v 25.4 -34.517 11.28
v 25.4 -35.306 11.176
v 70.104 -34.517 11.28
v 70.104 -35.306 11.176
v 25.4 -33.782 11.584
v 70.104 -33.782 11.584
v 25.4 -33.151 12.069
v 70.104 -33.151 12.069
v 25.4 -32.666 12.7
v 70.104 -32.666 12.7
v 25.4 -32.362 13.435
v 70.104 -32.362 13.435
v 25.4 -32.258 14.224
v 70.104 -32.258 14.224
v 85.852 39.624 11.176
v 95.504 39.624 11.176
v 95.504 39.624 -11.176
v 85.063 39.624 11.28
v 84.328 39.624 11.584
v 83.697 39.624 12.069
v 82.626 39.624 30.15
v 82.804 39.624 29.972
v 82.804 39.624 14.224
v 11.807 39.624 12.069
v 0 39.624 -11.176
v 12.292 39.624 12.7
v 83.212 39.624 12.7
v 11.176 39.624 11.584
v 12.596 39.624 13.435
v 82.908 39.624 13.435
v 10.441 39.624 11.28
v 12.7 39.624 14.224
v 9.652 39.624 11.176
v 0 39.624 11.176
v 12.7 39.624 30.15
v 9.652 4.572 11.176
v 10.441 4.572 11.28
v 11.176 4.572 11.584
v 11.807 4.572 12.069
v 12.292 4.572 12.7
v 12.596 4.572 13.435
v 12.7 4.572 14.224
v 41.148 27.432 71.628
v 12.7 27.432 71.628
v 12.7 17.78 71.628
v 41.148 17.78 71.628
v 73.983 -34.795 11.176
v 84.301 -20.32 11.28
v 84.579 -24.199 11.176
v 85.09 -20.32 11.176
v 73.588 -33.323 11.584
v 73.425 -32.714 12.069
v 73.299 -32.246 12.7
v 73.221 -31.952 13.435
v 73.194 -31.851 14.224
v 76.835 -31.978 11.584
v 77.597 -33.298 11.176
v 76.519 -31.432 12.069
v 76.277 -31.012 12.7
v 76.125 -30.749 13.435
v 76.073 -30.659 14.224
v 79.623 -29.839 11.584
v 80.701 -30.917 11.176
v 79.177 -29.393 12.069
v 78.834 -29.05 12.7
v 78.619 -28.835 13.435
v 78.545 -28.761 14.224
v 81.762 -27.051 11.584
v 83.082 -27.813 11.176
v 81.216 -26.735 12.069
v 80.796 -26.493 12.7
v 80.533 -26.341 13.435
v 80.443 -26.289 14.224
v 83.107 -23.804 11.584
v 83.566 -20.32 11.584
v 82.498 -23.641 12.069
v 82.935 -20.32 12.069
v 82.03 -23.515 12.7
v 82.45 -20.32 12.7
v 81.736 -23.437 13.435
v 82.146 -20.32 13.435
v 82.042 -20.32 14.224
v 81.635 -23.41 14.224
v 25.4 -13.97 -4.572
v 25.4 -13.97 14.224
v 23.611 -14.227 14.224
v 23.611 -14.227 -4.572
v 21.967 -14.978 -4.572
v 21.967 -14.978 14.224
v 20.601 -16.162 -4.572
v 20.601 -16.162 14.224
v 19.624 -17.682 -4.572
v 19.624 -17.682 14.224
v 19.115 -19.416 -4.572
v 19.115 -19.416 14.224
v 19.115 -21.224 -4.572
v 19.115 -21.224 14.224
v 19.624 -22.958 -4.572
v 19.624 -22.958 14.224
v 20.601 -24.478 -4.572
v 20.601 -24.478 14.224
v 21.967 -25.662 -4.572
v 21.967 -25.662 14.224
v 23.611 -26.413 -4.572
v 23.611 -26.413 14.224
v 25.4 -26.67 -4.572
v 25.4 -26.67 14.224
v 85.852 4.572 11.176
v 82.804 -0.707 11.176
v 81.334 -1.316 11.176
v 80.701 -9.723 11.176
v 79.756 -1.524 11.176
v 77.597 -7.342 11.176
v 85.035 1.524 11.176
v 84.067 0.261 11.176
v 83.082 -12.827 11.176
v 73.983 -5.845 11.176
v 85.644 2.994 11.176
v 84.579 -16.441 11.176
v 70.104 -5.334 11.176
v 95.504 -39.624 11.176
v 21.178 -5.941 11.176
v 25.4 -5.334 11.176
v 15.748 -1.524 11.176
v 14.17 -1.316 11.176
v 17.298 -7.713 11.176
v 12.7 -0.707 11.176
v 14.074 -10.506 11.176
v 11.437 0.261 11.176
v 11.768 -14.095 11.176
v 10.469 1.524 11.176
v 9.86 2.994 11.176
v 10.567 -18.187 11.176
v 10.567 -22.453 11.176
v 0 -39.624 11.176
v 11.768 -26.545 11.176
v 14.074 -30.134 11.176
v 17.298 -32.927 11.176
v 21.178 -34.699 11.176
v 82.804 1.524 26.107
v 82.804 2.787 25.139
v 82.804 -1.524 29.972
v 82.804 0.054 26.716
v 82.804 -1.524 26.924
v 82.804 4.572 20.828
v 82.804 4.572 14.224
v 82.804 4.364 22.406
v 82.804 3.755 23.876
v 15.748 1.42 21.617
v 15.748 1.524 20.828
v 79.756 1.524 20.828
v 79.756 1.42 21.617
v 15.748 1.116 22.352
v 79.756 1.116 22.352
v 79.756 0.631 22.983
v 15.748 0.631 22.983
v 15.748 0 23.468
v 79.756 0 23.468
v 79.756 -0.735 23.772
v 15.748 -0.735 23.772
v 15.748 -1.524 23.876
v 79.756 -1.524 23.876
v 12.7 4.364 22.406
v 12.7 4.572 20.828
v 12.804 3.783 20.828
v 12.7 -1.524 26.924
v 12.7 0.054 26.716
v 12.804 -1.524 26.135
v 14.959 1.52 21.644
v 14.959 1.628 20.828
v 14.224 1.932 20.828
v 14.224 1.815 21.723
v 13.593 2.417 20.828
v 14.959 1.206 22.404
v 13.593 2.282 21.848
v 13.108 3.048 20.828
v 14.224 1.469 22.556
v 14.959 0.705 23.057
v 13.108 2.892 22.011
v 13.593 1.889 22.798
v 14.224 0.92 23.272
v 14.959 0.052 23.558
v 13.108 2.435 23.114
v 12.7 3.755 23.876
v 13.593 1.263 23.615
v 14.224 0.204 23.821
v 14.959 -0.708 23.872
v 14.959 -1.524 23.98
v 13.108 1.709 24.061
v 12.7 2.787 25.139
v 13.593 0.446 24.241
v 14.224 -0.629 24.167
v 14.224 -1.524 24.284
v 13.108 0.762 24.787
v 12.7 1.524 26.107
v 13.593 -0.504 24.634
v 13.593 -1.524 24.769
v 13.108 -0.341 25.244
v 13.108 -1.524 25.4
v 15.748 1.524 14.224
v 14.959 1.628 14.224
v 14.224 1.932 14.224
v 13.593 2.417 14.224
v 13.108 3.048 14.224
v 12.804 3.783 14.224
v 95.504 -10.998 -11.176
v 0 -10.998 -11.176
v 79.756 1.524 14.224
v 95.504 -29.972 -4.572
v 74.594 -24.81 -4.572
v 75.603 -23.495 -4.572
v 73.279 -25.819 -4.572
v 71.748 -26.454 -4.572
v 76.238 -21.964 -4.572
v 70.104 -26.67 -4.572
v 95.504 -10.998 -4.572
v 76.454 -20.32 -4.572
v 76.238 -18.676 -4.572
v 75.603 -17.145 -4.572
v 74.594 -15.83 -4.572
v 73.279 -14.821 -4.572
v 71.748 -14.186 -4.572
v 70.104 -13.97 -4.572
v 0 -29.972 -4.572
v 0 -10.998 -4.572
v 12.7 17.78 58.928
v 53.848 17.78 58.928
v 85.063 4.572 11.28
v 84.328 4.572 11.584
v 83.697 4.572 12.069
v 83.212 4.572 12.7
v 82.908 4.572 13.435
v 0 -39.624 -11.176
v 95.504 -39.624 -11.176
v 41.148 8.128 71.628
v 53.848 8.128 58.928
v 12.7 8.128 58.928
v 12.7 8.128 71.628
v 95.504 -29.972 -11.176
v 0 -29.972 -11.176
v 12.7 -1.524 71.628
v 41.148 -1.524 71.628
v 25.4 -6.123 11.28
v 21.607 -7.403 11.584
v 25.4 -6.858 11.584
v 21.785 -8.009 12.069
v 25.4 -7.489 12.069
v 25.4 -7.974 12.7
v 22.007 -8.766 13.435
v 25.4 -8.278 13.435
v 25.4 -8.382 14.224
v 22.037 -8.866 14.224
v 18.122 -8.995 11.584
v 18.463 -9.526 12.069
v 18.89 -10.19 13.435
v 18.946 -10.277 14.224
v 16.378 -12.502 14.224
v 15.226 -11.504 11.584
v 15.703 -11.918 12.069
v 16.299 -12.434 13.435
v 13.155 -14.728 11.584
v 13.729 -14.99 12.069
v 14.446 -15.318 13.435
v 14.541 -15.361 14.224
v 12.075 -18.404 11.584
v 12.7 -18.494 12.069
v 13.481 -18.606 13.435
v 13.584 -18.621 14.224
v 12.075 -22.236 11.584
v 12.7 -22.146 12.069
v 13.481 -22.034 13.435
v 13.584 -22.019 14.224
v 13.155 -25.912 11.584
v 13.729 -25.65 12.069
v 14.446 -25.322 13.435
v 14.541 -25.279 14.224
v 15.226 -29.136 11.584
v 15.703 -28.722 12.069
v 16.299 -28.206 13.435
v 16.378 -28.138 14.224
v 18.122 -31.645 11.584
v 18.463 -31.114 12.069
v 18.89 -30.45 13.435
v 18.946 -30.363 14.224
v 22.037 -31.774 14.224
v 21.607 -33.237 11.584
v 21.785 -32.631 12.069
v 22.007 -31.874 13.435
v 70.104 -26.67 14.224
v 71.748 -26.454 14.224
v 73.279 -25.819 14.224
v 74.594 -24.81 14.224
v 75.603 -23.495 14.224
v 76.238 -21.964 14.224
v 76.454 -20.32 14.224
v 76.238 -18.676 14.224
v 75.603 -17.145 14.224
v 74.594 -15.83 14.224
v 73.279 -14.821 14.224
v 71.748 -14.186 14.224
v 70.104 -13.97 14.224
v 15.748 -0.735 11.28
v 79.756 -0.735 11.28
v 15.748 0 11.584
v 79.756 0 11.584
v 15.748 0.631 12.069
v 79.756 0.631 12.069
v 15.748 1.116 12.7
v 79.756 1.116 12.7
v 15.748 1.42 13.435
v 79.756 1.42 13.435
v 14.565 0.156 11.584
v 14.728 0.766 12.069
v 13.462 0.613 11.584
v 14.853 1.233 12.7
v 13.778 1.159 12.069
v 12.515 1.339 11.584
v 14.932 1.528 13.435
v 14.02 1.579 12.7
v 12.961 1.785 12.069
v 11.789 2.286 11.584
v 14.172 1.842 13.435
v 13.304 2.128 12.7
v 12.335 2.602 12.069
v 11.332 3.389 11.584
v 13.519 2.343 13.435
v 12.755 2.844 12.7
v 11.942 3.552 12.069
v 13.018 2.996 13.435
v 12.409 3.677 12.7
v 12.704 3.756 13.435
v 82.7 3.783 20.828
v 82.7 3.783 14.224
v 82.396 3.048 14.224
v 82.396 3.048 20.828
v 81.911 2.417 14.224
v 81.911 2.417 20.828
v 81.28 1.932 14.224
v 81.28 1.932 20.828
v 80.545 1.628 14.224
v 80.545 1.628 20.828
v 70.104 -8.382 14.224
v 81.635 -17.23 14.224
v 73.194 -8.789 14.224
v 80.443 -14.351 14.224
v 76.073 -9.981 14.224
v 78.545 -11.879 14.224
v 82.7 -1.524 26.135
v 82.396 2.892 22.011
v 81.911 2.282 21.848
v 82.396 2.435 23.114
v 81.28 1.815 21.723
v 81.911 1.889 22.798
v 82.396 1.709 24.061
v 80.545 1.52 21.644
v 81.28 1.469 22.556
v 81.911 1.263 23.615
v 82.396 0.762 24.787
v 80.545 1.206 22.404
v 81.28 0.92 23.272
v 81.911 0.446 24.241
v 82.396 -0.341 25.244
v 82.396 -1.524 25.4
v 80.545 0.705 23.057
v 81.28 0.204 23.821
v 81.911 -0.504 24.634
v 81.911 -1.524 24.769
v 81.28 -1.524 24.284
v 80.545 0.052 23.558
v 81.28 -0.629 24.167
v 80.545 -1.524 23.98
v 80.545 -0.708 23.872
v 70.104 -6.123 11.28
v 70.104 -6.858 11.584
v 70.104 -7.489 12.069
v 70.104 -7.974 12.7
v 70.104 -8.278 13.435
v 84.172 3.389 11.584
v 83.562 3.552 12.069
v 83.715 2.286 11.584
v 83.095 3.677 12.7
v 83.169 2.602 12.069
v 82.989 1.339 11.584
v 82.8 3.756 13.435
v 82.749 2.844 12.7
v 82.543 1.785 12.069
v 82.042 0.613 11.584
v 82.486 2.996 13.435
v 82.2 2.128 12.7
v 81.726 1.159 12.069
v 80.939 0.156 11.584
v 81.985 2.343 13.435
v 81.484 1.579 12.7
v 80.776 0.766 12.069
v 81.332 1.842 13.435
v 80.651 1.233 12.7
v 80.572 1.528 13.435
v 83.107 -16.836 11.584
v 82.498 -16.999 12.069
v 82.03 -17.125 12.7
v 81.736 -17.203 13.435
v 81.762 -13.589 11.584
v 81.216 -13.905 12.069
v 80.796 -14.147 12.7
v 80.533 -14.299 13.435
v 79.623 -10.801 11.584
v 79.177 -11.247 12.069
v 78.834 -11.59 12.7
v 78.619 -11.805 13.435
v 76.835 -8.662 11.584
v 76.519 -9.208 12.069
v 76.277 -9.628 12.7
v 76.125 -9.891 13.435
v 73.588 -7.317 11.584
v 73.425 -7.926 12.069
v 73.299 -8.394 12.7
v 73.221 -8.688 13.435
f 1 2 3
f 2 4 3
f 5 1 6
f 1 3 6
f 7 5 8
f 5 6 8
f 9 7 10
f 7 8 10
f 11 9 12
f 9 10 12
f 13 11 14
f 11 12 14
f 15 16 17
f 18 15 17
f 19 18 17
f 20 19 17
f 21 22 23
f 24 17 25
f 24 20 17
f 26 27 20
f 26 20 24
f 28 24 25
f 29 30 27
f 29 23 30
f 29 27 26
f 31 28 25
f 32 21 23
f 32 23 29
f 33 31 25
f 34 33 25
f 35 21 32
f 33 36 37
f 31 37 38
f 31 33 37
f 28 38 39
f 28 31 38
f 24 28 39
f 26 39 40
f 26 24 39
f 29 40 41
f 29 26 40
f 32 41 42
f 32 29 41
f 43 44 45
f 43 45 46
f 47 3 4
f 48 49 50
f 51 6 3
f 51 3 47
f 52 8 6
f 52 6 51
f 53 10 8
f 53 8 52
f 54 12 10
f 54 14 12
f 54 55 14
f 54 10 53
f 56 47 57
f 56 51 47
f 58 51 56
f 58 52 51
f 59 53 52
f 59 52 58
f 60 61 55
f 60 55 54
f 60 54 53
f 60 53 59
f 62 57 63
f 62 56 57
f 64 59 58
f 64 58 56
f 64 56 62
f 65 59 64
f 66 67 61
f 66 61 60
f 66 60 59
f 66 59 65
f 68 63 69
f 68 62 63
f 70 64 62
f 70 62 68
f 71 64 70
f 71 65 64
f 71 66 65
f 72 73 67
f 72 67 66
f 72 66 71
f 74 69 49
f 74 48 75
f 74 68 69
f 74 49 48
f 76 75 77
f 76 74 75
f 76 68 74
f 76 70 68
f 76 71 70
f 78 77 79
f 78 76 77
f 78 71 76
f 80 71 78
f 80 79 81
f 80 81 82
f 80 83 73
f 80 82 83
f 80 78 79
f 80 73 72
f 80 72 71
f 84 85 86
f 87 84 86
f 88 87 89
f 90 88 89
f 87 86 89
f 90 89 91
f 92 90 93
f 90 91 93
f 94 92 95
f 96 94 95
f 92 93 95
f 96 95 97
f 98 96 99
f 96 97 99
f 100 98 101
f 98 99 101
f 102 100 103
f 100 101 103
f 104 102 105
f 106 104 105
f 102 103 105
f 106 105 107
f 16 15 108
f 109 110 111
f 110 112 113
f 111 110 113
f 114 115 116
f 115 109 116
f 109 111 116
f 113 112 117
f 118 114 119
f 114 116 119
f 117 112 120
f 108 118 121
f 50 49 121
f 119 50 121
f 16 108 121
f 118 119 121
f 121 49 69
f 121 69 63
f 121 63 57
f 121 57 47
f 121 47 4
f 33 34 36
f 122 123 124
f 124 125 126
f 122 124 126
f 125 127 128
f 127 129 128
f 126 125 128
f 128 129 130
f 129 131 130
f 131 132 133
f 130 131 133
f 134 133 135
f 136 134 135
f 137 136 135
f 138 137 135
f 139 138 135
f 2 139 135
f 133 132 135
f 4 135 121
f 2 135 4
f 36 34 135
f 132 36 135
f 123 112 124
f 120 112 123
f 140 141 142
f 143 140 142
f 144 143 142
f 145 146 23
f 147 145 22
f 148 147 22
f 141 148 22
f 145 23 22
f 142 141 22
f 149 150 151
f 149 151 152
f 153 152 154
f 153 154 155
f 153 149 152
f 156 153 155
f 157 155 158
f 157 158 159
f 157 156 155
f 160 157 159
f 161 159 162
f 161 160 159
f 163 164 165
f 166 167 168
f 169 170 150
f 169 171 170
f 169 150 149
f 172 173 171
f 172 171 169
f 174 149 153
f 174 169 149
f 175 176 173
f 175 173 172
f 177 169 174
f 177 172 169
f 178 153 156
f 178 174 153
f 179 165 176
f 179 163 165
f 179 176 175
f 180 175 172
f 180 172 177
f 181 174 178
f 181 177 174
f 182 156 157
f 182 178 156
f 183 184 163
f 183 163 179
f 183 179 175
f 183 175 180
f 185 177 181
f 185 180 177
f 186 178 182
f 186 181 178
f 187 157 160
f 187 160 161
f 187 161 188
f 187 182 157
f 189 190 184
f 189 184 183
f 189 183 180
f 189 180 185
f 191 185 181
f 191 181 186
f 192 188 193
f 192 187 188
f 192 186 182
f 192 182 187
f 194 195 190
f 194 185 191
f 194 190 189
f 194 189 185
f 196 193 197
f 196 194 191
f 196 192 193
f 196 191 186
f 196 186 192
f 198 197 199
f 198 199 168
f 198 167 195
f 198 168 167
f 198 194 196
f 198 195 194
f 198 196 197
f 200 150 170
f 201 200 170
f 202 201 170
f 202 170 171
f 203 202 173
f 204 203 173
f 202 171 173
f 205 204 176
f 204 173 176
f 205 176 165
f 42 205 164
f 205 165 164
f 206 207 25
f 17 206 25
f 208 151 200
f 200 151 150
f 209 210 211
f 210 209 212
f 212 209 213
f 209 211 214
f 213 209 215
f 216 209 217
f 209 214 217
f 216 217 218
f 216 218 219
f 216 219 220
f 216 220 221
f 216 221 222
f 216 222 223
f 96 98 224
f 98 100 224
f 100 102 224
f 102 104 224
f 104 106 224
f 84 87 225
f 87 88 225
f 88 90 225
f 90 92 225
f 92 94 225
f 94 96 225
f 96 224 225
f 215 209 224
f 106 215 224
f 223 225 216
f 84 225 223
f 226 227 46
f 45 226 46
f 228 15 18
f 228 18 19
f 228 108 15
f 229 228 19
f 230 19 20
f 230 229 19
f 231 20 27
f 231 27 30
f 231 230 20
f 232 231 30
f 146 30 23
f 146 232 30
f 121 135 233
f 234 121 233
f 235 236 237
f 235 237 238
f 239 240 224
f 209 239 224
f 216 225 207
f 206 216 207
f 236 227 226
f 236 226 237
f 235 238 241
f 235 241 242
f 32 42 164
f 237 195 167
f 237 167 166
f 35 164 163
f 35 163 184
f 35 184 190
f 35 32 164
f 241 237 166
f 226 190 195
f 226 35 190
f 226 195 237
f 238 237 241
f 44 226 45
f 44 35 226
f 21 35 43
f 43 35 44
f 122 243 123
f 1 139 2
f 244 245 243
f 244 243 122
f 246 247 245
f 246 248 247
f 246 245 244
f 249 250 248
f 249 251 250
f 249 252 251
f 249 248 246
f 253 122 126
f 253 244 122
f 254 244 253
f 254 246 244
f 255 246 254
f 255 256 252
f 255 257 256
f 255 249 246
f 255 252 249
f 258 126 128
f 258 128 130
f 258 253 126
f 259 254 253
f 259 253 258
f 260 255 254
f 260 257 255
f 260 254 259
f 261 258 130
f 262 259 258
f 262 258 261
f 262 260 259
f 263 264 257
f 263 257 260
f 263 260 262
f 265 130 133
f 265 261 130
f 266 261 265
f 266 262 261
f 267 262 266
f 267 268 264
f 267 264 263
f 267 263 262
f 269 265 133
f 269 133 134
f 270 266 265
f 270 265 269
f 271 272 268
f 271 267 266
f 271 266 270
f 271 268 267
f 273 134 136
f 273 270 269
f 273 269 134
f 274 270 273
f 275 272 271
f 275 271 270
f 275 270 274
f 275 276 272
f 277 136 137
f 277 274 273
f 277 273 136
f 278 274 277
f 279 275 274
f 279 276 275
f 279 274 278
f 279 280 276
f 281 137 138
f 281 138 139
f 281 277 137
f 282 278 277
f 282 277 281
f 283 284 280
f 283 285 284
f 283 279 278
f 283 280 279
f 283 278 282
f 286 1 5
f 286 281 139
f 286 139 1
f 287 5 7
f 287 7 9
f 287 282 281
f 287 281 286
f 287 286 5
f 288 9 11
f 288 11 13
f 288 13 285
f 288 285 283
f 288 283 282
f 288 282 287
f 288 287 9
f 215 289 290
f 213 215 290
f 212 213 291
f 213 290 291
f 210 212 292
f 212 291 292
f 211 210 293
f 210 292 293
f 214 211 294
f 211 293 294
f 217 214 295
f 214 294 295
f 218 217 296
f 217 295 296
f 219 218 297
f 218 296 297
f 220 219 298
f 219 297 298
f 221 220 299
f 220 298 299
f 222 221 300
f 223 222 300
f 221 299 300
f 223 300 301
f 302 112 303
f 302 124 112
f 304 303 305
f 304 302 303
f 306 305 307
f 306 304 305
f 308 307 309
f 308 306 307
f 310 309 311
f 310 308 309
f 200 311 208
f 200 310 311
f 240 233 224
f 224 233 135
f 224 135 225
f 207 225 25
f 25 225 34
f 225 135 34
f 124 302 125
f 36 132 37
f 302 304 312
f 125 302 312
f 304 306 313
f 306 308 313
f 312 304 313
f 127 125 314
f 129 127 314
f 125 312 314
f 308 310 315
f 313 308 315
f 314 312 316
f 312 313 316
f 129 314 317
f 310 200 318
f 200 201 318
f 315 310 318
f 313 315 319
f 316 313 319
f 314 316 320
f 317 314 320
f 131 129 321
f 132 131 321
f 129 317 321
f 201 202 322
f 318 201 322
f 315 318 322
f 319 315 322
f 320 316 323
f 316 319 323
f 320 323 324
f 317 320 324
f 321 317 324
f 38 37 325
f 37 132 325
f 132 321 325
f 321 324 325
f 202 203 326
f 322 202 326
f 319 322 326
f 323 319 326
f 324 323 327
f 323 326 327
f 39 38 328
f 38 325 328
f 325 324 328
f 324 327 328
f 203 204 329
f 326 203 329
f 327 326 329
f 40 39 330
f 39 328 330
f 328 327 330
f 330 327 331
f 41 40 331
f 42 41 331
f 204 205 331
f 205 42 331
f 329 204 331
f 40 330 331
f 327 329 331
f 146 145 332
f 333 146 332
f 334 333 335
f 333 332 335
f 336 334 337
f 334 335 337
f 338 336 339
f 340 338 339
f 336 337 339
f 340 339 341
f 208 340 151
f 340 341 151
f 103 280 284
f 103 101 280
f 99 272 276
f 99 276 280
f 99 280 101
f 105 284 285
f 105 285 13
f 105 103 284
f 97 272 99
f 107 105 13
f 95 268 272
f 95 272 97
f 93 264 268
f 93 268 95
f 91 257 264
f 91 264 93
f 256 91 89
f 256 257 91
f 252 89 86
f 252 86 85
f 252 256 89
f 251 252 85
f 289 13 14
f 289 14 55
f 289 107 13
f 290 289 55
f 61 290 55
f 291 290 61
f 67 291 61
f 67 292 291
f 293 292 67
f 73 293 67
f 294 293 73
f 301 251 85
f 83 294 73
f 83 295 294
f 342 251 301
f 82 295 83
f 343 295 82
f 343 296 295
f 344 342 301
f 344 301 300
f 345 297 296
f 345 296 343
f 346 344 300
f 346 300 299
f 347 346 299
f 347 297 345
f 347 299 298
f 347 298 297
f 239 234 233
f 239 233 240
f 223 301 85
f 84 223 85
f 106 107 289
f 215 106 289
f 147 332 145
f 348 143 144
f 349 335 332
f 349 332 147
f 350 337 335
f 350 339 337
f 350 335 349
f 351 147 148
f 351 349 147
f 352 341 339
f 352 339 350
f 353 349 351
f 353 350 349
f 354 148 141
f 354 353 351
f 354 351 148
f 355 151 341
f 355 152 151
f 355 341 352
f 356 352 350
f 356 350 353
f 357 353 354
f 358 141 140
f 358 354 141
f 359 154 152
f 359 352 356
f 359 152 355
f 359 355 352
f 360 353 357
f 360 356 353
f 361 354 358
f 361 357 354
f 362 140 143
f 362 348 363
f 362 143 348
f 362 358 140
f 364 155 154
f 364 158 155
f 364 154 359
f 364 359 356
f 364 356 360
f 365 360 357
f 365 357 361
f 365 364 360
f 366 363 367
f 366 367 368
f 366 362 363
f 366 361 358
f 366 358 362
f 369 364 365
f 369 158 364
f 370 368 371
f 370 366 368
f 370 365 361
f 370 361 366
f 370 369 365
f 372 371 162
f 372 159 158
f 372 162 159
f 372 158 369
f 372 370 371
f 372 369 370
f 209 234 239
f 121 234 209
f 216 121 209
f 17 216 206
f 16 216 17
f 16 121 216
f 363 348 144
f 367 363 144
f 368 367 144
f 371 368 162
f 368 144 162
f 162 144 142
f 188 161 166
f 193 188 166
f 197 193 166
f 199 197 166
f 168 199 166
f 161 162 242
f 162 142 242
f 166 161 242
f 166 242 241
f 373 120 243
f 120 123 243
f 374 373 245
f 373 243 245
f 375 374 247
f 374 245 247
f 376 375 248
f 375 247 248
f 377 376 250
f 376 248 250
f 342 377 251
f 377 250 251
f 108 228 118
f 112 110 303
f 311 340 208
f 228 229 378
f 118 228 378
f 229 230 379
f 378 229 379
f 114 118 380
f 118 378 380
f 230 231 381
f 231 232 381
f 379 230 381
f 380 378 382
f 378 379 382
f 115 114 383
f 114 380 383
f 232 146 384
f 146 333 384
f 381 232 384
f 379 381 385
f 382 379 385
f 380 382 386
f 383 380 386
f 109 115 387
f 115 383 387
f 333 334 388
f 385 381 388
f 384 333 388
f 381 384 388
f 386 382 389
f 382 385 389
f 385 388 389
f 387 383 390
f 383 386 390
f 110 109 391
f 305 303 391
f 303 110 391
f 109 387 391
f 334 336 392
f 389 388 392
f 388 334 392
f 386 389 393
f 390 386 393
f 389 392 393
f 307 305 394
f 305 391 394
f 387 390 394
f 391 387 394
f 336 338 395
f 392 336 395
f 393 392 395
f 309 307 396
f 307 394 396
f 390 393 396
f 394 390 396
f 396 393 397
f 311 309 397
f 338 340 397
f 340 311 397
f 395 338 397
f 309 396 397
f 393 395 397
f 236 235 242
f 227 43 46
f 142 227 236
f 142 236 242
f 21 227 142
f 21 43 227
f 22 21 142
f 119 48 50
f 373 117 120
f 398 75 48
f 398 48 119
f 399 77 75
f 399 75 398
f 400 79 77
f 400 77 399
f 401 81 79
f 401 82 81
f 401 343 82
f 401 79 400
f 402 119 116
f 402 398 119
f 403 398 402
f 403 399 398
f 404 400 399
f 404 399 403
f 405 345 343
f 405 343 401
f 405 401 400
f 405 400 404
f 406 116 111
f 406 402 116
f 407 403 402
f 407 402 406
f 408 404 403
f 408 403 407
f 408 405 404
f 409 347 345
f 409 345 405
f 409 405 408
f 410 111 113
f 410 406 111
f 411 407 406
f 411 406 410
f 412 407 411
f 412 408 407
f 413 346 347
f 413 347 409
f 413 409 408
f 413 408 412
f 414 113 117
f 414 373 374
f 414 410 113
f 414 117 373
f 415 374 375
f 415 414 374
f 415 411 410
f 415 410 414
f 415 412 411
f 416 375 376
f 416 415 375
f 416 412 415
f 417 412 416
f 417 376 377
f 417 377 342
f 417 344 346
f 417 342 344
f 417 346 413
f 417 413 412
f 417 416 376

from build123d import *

# Parameters (mm, degrees)
F1_DEPTH = 95.504
F3_DEPTH = 3.048
F4_DEPTH = 22.353
F6_DEPTH = 41.148
F5_W     = 70.104
F5_H     = 12.7
F7_DEPTH = 38.1
F8_W     = 9.652
F8_H     = 12.7
F9_DEPTH = 82.805
F10_F1_R = 3.0479
F10_F2_R = 3.048
F10_F3_R = 3.048


# Not quite as in the source:
# - a fillet or chamfer is up to 0.001 mm smaller than in the source, because OpenCascade refuses the exact size


with BuildPart() as f1:
    # F0 (on Right) → F1 (new body)
    with BuildSketch(Plane.YZ):
        Polygon((39.624, -11.176), (39.624, 11.176), (-39.624, 11.176), (-39.624, -11.176), (-29.972, -11.176), (-29.972, -4.572), (-10.9982, -4.572), (-10.9982, -11.176), align=None)
    extrude(amount=F1_DEPTH)

    # F2 (on face) → F3 (join)
    with BuildSketch(Plane.XY.offset(11.176)):
        with BuildLine():
            ThreePointArc((25.4, -26.67), (19.05, -20.32), (25.4, -13.97))
            Line((25.4, -13.97), (35.509072361, -13.97))
            ThreePointArc((35.509072361, -13.97), (31.1753590365, -9.871982389), (25.4, -8.382))
            ThreePointArc((25.4, -8.382), (13.462, -20.32), (25.4, -32.258))
            ThreePointArc((25.4, -32.258), (31.1753590365, -30.768017611), (35.509072361, -26.67))
            Line((35.509072361, -26.67), (25.4, -26.67))
        make_face()
        with BuildLine():
            ThreePointArc((25.4, -8.382), (31.1753590365, -9.871982389), (35.509072361, -13.97))
            Line((35.509072361, -13.97), (59.994927639, -13.97))
            ThreePointArc((59.994927639, -13.97), (64.3286409635, -9.871982389), (70.104, -8.382))
            Line((70.104, -8.382), (25.4, -8.382))
        make_face()
        with BuildLine():
            Line((59.994927639, -26.67), (35.509072361, -26.67))
            ThreePointArc((35.509072361, -26.67), (31.1753590365, -30.768017611), (25.4, -32.258))
            Line((25.4, -32.258), (70.104, -32.258))
            ThreePointArc((70.104, -32.258), (64.3286409635, -30.768017611), (59.994927639, -26.67))
        make_face()
        with BuildLine():
            ThreePointArc((70.104, -8.382), (64.3286409635, -9.871982389), (59.994927639, -13.97))
            Line((59.994927639, -13.97), (70.104, -13.97))
            ThreePointArc((70.104, -13.97), (74.5941280605, -15.8298719395), (76.454, -20.32))
            ThreePointArc((76.454, -20.32), (74.5941280605, -24.8101280605), (70.104, -26.67))
            Line((70.104, -26.67), (59.994927639, -26.67))
            ThreePointArc((59.994927639, -26.67), (64.3286409635, -30.768017611), (70.104, -32.258))
            ThreePointArc((70.104, -32.258), (78.5454407538, -28.7614407538), (82.042, -20.32))
            ThreePointArc((82.042, -20.32), (78.5454407538, -11.8785592462), (70.104, -8.382))
        make_face()
    extrude(amount=F3_DEPTH)

    # F2 (on face) → F4 (cut, through all)
    with BuildSketch(Plane.XY.offset(11.176)):
        with BuildLine():
            ThreePointArc((25.4, -26.67), (29.8901280605, -24.8101280605), (31.75, -20.32))
            ThreePointArc((31.75, -20.32), (29.8901280605, -15.8298719395), (25.4, -13.97))
            ThreePointArc((25.4, -13.97), (19.05, -20.32), (25.4, -26.67))
        make_face()
        with BuildLine():
            ThreePointArc((25.4, -13.97), (29.8901280605, -15.8298719395), (31.75, -20.32))
            ThreePointArc((31.75, -20.32), (29.8901280605, -24.8101280605), (25.4, -26.67))
            Line((25.4, -26.67), (35.509072361, -26.67))
            ThreePointArc((35.509072361, -26.67), (36.8716596412, -23.6240685642), (37.338, -20.32))
            ThreePointArc((37.338, -20.32), (36.8716596412, -17.0159314358), (35.509072361, -13.97))
            Line((35.509072361, -13.97), (25.4, -13.97))
        make_face()
        with BuildLine():
            Line((59.994927639, -13.97), (35.509072361, -13.97))
            ThreePointArc((35.509072361, -13.97), (36.8716596412, -17.0159314358), (37.338, -20.32))
            ThreePointArc((37.338, -20.32), (36.8716596412, -23.6240685642), (35.509072361, -26.67))
            Line((35.509072361, -26.67), (59.994927639, -26.67))
            ThreePointArc((59.994927639, -26.67), (58.166, -20.32), (59.994927639, -13.97))
        make_face()
        with BuildLine():
            Line((70.104, -13.97), (59.994927639, -13.97))
            ThreePointArc((59.994927639, -13.97), (58.166, -20.32), (59.994927639, -26.67))
            Line((59.994927639, -26.67), (70.104, -26.67))
            ThreePointArc((70.104, -26.67), (63.754, -20.32), (70.104, -13.97))
        make_face()
        with BuildLine():
            ThreePointArc((76.454, -20.32), (74.5941280605, -15.8298719395), (70.104, -13.97))
            ThreePointArc((70.104, -13.97), (63.754, -20.32), (70.104, -26.67))
            ThreePointArc((70.104, -26.67), (74.5941280605, -24.8101280605), (76.454, -20.32))
        make_face()
    extrude(amount=-F4_DEPTH, mode=Mode.SUBTRACT)



with BuildPart() as f6:
    # F5 (on face) → F6 (new body)
    with BuildSketch(Plane(origin=(0, 39.624, 0), x_dir=(-1, 0, 0), z_dir=(0, 1, 0))):
        Polygon((-82.804, 29.972), (-82.804, 23.876), (-12.7, 23.876), (-12.7, 71.628), (-41.148, 71.628), align=None)
    extrude(amount=-F6_DEPTH)


with BuildPart() as f1_1:
    add(f1.part)

    add(f6.part)  # F7 merges F6
    # F5 (on face) → F7 (join)
    with BuildSketch(Plane(origin=(0, 39.624, 0), x_dir=(-1, 0, 0), z_dir=(0, 1, 0))):
        with Locations((-47.752, 17.526)):
            Rectangle(F5_W, F5_H)
    extrude(amount=-F7_DEPTH)

    # F8 (on face) → F9 (cut, through all)
    with BuildSketch(Plane(origin=(12.7, 0, 0), x_dir=(0, -1, 0), z_dir=(-1, 0, 0))):
        Polygon((-39.624, 71.628), (-39.624, 30.1498), (-27.432, 71.628), align=None)
        with Locations((-12.954, 65.278)):
            Rectangle(F8_W, F8_H)
    extrude(amount=-F9_DEPTH, mode=Mode.SUBTRACT)

    # F10: fillet of radius 3.048 on 10 edges, made by hand

    # F10_f1 (radius 3.048 in the source; OpenCascade refuses exactly that, so slightly less here)
    f10_f1_edges = [f1_1.edges().sort_by_distance(p)[0] for p in [
        (47.752, 1.524, 23.876),
        (47.752, -32.258, 11.176),
        (82.042, -20.32, 11.176),
        (47.752, -8.382, 11.176),
        (13.462, -20.32, 11.176),
    ]]
    fillet(f10_f1_edges, radius=F10_F1_R)

    # F10_f2
    f10_f2_edges = [f1_1.edges().sort_by_distance(p)[0] for p in [
        (82.804, 1.524, 16.00205),
        (12.7, 1.524, 16.00205),
        (12.7, 0.6312907584, 22.9832907584),
        (82.804, 0.6312907584, 22.9832907584),
    ]]
    fillet(f10_f2_edges, radius=F10_F2_R)

    # F10_f3
    f10_f3_edges = [f1_1.edges().sort_by_distance(p)[0] for p in [
        (47.752, 1.524, 11.176),
        (12.7, 22.098, 11.176),
        (82.804, 22.098, 11.176),
        (81.9112614691, 2.4167385309, 11.176),
        (13.5927385309, 2.4167385309, 11.176),
    ]]
    fillet(f10_f3_edges, radius=F10_F3_R)


solid = f1_1.part
